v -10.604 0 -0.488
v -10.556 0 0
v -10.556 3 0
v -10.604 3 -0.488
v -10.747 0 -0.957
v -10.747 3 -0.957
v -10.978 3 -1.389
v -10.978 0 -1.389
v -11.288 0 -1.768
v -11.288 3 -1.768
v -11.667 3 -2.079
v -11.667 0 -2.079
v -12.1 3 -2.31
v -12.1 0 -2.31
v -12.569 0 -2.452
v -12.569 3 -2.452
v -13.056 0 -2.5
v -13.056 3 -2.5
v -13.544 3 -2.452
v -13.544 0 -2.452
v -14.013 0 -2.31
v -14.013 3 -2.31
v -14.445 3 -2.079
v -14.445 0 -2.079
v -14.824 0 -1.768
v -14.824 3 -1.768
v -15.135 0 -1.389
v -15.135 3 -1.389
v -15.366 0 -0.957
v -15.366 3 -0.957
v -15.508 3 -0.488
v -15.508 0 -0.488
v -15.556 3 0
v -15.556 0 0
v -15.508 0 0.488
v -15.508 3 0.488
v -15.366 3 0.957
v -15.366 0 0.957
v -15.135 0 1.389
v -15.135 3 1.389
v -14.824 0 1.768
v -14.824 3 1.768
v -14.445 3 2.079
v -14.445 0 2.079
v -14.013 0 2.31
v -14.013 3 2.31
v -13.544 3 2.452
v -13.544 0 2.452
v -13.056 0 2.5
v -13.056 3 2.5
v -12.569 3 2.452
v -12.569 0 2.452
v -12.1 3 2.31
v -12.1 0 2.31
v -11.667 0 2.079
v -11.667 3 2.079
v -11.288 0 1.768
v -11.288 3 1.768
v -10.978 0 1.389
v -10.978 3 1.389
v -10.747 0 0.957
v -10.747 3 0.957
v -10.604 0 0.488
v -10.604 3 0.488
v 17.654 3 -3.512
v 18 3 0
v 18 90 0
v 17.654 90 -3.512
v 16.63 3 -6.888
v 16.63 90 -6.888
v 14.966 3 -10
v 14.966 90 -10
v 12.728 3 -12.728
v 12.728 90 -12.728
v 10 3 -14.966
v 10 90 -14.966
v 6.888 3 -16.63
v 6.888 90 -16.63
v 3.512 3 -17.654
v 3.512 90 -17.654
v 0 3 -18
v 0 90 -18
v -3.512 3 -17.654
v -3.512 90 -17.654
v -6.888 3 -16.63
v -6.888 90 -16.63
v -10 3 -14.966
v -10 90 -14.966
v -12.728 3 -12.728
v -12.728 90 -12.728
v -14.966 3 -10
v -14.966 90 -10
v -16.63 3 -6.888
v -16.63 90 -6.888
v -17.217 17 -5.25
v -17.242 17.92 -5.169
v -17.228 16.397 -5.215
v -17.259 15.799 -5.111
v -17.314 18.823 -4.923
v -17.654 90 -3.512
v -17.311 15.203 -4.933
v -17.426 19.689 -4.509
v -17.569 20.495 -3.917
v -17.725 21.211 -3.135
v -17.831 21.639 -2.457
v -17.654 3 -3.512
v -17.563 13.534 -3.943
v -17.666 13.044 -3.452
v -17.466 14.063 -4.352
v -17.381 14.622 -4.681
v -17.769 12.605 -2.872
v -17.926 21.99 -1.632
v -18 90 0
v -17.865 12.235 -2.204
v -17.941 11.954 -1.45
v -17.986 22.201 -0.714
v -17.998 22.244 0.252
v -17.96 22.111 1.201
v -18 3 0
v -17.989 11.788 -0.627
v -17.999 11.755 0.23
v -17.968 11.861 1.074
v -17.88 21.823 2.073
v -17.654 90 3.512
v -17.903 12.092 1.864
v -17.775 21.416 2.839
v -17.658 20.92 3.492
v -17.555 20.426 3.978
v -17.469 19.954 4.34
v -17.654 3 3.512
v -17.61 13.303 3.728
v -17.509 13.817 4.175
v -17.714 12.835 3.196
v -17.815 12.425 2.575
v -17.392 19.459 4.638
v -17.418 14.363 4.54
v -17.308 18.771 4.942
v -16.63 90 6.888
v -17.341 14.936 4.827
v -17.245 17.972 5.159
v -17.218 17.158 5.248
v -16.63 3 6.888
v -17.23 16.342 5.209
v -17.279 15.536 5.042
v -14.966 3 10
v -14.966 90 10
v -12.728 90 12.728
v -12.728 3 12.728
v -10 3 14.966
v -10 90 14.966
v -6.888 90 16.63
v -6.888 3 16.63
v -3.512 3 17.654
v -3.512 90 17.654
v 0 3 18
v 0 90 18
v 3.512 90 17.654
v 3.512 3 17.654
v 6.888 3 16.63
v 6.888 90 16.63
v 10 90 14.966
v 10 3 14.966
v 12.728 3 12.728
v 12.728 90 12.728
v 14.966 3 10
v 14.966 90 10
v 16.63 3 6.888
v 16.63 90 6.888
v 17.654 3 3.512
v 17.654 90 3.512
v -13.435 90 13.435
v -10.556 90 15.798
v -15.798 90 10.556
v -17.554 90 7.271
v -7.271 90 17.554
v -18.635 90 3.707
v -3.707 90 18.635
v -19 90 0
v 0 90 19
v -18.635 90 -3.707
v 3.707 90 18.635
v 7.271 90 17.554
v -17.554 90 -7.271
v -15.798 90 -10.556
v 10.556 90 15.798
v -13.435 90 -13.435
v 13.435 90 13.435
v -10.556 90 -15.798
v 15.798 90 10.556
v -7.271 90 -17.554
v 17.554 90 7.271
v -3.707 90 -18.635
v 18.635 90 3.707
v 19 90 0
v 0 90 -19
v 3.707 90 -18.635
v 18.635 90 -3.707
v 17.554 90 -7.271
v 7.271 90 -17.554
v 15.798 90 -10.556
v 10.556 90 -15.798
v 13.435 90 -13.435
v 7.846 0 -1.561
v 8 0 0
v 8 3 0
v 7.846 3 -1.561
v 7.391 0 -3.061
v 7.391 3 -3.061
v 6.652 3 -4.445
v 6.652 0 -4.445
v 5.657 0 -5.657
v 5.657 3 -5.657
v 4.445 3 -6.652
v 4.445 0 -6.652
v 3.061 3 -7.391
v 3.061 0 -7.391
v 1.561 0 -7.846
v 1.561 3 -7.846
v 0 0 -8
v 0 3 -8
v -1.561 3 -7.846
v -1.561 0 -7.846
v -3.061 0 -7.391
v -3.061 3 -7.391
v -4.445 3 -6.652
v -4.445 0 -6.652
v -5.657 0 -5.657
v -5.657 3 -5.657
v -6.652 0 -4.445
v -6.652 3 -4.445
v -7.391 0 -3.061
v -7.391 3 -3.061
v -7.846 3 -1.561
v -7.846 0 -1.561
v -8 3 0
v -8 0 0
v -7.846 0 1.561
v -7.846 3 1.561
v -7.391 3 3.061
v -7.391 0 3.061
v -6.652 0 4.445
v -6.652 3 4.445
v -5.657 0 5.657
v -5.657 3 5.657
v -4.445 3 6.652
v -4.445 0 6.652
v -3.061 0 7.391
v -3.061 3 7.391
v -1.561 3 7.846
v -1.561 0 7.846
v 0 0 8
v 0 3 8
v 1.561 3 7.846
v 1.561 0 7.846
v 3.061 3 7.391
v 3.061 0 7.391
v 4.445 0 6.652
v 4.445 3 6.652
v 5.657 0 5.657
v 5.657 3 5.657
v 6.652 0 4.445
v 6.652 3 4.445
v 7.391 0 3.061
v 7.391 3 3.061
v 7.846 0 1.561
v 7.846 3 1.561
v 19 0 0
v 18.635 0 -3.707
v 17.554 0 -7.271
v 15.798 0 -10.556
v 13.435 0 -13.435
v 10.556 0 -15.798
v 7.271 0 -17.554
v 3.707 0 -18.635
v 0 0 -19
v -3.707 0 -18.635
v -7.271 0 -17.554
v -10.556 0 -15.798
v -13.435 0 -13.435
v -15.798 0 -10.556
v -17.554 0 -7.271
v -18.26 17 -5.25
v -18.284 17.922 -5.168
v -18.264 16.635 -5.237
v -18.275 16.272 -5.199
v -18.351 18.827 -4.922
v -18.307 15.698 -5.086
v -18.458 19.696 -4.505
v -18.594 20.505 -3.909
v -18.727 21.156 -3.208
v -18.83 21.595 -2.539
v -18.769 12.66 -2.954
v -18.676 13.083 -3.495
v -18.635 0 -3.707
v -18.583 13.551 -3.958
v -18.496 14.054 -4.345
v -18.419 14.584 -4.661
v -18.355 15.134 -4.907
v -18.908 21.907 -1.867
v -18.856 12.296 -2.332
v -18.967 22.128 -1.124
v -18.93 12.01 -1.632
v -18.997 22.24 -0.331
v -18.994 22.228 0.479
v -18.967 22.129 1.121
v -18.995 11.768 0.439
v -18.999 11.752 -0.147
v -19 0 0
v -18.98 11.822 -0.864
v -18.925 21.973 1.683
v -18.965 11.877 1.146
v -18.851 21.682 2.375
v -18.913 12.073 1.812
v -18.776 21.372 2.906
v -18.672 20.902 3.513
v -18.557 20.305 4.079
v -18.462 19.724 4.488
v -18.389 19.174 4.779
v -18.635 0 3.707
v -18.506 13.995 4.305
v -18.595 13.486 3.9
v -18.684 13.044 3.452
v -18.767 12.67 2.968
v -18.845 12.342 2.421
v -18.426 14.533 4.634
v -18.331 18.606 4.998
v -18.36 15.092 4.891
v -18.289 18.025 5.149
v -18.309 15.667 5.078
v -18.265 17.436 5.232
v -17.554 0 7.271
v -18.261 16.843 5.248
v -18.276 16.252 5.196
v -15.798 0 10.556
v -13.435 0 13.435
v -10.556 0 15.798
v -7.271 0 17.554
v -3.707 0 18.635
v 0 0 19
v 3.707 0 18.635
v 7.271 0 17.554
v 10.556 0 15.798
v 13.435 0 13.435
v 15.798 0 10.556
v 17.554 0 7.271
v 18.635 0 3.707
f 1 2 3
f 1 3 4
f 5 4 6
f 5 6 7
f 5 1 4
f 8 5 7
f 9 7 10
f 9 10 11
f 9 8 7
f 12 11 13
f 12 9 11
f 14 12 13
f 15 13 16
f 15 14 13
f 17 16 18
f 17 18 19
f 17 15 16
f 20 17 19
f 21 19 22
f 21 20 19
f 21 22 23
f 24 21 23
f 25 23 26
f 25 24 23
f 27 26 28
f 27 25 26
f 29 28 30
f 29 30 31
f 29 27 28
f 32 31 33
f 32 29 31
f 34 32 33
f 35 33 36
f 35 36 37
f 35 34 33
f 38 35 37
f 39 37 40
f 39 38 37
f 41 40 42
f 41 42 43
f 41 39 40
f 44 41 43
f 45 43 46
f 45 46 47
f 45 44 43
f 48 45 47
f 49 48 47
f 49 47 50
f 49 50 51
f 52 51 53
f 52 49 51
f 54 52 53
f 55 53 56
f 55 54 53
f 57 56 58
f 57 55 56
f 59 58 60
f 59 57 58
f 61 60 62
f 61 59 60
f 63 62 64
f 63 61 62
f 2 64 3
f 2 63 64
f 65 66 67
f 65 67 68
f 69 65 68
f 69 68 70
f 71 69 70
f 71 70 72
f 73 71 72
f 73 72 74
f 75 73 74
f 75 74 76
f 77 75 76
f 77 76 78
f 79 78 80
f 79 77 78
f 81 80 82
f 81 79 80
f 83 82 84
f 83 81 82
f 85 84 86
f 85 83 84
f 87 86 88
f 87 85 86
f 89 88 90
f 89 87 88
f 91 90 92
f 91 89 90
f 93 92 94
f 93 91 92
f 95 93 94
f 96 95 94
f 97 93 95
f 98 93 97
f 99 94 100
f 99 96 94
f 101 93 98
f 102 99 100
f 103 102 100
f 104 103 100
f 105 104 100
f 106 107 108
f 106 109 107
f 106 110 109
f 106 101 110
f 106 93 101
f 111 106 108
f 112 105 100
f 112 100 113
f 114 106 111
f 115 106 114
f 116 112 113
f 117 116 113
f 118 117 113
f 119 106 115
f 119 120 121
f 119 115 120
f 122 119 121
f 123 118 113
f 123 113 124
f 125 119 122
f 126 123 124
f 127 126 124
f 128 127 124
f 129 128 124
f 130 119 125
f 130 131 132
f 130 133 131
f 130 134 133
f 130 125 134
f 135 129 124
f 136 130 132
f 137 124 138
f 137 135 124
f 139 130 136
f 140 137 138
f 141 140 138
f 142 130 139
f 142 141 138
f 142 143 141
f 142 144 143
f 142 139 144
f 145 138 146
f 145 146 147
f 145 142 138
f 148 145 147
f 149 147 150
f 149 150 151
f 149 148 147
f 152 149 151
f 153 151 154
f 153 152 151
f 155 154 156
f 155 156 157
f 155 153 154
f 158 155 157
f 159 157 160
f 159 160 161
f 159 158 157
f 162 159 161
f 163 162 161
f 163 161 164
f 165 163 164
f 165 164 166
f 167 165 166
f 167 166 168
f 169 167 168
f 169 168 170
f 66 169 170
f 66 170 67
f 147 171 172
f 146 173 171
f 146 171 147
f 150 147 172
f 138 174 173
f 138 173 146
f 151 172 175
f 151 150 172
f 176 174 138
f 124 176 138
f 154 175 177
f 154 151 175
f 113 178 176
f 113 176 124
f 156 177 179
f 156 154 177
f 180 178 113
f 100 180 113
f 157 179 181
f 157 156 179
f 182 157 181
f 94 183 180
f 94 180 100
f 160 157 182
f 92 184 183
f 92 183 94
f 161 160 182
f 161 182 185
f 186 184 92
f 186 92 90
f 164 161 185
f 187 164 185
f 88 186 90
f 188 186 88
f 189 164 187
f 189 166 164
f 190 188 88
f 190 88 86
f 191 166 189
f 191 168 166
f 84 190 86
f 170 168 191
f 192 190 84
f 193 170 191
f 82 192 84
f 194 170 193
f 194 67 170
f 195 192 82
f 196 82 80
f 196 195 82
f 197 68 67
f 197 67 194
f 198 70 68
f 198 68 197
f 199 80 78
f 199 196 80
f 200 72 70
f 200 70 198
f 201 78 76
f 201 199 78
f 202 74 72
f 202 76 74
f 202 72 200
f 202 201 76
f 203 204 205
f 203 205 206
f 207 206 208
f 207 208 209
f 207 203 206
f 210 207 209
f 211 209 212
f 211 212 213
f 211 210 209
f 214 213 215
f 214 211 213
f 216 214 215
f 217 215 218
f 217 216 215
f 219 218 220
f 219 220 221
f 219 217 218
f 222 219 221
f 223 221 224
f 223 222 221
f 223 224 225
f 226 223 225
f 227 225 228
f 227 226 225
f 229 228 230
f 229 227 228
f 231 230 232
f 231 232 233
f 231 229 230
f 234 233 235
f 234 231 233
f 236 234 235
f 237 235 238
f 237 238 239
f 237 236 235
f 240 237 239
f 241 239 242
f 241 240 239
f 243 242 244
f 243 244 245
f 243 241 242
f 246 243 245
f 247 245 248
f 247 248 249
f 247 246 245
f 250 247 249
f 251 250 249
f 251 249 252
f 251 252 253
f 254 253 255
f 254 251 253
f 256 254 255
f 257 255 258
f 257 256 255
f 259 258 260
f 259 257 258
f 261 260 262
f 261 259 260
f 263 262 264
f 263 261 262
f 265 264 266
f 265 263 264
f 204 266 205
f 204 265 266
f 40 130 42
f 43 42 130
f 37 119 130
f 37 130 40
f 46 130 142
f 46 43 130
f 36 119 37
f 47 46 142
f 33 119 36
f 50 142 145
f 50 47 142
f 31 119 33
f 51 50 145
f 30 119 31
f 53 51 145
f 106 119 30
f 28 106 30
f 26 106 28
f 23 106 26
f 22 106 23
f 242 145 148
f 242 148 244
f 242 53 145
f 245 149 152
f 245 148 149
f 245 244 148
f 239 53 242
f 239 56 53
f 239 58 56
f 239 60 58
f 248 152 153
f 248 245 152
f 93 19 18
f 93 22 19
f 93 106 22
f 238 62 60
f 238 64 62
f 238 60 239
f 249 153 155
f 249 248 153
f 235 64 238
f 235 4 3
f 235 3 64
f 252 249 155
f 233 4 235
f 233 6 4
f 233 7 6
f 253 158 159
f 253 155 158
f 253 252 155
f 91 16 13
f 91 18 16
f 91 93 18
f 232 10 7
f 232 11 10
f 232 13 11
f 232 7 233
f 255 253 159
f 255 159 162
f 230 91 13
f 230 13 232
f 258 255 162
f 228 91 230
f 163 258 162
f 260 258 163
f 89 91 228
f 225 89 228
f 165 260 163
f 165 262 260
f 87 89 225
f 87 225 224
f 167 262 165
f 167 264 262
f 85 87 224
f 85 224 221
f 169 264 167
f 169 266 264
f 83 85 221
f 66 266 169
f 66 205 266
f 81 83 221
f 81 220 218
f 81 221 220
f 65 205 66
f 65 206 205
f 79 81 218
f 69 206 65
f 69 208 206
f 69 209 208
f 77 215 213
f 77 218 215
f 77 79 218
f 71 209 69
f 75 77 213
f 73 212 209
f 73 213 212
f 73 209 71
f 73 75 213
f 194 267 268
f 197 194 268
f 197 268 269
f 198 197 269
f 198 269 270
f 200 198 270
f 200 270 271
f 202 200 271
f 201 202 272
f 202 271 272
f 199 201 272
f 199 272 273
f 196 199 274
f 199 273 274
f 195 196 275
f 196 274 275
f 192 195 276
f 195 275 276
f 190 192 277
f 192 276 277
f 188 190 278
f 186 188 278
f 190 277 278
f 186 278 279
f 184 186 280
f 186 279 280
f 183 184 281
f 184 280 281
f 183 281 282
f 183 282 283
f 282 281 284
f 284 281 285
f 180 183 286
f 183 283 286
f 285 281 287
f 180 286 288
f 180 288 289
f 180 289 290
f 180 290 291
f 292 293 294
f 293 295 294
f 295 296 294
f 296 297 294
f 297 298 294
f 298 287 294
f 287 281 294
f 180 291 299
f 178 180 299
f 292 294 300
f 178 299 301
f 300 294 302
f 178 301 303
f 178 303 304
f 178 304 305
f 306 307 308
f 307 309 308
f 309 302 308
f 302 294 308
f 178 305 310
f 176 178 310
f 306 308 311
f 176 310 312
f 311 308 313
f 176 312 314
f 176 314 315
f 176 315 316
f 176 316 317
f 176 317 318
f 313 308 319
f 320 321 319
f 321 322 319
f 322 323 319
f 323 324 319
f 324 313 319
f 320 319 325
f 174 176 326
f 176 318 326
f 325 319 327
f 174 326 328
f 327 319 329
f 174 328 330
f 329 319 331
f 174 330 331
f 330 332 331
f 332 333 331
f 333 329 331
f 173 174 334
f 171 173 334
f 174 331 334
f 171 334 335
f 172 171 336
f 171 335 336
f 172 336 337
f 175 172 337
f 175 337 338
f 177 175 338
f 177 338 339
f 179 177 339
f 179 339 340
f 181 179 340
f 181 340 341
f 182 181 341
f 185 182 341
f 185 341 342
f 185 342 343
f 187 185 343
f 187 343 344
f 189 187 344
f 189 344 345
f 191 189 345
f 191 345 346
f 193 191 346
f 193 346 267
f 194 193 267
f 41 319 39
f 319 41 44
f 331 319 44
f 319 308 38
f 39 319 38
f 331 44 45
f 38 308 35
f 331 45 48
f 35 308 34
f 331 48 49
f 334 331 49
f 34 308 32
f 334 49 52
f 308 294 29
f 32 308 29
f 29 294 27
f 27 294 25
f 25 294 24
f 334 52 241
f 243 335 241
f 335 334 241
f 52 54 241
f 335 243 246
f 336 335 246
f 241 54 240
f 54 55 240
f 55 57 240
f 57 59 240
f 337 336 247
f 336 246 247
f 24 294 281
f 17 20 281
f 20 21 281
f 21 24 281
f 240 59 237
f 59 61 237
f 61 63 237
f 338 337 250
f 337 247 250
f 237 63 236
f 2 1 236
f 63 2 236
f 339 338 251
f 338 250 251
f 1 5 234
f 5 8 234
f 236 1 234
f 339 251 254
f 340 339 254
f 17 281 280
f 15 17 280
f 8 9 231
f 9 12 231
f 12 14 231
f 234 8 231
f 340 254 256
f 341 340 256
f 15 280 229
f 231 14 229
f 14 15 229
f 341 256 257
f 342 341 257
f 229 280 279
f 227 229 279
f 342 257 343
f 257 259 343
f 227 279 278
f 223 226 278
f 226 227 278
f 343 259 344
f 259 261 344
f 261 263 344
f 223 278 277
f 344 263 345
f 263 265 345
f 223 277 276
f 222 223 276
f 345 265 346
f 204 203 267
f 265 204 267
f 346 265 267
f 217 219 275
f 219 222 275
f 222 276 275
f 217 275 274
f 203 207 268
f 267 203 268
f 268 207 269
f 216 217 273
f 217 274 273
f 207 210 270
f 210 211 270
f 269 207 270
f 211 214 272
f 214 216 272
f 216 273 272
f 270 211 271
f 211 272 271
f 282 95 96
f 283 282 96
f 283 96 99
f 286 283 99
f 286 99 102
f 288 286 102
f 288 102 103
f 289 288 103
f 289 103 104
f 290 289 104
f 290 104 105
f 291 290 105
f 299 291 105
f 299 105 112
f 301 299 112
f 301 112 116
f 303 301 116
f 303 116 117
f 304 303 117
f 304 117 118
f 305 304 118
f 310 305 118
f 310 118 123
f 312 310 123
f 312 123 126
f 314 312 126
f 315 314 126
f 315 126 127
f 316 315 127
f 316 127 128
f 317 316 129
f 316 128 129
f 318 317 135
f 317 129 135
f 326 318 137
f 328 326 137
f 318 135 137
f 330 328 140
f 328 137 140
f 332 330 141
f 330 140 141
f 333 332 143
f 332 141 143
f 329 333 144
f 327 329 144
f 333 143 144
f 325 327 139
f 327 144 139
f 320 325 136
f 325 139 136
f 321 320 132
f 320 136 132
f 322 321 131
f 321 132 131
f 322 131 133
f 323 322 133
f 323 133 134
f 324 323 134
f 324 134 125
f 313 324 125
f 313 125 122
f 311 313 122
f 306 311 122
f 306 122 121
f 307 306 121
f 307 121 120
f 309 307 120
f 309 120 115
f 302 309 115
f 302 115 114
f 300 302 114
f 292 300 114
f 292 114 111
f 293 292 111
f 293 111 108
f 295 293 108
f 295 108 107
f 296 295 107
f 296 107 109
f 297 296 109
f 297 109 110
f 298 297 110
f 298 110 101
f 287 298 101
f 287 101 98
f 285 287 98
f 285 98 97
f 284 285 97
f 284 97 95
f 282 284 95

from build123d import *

# Parameters (mm, degrees)
SKETCH1_R           = 19
SKETCH1_R_2         = 8
SKETCH1_R_3         = 2.5
BOSS_EXTRUDE1_DEPTH = 3
SKETCH1_5_R         = 19
SKETCH1_5_R_2       = 18
BOSS_EXTRUDE2_DEPTH = 90
SKETCH2_R           = 5.25
CUT_EXTRUDE1_DEPTH  = 94.925502394


with BuildPart() as part:
    # Sketch1 → Boss-Extrude1 (new body)
    with BuildSketch(Plane(origin=(0, 0, 0), x_dir=(1, 0, 0), z_dir=(0, 1, 0))):
        Circle(SKETCH1_R)
        Circle(SKETCH1_R_2, mode=Mode.SUBTRACT)
        with Locations((-13.05625, 0)):
            Circle(SKETCH1_R_3, mode=Mode.SUBTRACT)
    extrude(amount=BOSS_EXTRUDE1_DEPTH)

    # Sketch1<5> → Boss-Extrude2 (add)
    with BuildSketch(Plane(origin=(0, 0, 0), x_dir=(1, 0, 0), z_dir=(0, 1, 0))):
        Circle(SKETCH1_5_R)
        Circle(SKETCH1_5_R_2, mode=Mode.SUBTRACT)
    extrude(amount=BOSS_EXTRUDE2_DEPTH)

    # Sketch2 → Cut-Extrude1 (cut, through all)
    with BuildSketch(Plane(origin=(0, 0, 0), x_dir=(0, 0, -1), z_dir=(1, 0, 0))):
        with Locations((0, 17)):
            Circle(SKETCH2_R)
    extrude(amount=-CUT_EXTRUDE1_DEPTH, mode=Mode.SUBTRACT)


solid = part.part
